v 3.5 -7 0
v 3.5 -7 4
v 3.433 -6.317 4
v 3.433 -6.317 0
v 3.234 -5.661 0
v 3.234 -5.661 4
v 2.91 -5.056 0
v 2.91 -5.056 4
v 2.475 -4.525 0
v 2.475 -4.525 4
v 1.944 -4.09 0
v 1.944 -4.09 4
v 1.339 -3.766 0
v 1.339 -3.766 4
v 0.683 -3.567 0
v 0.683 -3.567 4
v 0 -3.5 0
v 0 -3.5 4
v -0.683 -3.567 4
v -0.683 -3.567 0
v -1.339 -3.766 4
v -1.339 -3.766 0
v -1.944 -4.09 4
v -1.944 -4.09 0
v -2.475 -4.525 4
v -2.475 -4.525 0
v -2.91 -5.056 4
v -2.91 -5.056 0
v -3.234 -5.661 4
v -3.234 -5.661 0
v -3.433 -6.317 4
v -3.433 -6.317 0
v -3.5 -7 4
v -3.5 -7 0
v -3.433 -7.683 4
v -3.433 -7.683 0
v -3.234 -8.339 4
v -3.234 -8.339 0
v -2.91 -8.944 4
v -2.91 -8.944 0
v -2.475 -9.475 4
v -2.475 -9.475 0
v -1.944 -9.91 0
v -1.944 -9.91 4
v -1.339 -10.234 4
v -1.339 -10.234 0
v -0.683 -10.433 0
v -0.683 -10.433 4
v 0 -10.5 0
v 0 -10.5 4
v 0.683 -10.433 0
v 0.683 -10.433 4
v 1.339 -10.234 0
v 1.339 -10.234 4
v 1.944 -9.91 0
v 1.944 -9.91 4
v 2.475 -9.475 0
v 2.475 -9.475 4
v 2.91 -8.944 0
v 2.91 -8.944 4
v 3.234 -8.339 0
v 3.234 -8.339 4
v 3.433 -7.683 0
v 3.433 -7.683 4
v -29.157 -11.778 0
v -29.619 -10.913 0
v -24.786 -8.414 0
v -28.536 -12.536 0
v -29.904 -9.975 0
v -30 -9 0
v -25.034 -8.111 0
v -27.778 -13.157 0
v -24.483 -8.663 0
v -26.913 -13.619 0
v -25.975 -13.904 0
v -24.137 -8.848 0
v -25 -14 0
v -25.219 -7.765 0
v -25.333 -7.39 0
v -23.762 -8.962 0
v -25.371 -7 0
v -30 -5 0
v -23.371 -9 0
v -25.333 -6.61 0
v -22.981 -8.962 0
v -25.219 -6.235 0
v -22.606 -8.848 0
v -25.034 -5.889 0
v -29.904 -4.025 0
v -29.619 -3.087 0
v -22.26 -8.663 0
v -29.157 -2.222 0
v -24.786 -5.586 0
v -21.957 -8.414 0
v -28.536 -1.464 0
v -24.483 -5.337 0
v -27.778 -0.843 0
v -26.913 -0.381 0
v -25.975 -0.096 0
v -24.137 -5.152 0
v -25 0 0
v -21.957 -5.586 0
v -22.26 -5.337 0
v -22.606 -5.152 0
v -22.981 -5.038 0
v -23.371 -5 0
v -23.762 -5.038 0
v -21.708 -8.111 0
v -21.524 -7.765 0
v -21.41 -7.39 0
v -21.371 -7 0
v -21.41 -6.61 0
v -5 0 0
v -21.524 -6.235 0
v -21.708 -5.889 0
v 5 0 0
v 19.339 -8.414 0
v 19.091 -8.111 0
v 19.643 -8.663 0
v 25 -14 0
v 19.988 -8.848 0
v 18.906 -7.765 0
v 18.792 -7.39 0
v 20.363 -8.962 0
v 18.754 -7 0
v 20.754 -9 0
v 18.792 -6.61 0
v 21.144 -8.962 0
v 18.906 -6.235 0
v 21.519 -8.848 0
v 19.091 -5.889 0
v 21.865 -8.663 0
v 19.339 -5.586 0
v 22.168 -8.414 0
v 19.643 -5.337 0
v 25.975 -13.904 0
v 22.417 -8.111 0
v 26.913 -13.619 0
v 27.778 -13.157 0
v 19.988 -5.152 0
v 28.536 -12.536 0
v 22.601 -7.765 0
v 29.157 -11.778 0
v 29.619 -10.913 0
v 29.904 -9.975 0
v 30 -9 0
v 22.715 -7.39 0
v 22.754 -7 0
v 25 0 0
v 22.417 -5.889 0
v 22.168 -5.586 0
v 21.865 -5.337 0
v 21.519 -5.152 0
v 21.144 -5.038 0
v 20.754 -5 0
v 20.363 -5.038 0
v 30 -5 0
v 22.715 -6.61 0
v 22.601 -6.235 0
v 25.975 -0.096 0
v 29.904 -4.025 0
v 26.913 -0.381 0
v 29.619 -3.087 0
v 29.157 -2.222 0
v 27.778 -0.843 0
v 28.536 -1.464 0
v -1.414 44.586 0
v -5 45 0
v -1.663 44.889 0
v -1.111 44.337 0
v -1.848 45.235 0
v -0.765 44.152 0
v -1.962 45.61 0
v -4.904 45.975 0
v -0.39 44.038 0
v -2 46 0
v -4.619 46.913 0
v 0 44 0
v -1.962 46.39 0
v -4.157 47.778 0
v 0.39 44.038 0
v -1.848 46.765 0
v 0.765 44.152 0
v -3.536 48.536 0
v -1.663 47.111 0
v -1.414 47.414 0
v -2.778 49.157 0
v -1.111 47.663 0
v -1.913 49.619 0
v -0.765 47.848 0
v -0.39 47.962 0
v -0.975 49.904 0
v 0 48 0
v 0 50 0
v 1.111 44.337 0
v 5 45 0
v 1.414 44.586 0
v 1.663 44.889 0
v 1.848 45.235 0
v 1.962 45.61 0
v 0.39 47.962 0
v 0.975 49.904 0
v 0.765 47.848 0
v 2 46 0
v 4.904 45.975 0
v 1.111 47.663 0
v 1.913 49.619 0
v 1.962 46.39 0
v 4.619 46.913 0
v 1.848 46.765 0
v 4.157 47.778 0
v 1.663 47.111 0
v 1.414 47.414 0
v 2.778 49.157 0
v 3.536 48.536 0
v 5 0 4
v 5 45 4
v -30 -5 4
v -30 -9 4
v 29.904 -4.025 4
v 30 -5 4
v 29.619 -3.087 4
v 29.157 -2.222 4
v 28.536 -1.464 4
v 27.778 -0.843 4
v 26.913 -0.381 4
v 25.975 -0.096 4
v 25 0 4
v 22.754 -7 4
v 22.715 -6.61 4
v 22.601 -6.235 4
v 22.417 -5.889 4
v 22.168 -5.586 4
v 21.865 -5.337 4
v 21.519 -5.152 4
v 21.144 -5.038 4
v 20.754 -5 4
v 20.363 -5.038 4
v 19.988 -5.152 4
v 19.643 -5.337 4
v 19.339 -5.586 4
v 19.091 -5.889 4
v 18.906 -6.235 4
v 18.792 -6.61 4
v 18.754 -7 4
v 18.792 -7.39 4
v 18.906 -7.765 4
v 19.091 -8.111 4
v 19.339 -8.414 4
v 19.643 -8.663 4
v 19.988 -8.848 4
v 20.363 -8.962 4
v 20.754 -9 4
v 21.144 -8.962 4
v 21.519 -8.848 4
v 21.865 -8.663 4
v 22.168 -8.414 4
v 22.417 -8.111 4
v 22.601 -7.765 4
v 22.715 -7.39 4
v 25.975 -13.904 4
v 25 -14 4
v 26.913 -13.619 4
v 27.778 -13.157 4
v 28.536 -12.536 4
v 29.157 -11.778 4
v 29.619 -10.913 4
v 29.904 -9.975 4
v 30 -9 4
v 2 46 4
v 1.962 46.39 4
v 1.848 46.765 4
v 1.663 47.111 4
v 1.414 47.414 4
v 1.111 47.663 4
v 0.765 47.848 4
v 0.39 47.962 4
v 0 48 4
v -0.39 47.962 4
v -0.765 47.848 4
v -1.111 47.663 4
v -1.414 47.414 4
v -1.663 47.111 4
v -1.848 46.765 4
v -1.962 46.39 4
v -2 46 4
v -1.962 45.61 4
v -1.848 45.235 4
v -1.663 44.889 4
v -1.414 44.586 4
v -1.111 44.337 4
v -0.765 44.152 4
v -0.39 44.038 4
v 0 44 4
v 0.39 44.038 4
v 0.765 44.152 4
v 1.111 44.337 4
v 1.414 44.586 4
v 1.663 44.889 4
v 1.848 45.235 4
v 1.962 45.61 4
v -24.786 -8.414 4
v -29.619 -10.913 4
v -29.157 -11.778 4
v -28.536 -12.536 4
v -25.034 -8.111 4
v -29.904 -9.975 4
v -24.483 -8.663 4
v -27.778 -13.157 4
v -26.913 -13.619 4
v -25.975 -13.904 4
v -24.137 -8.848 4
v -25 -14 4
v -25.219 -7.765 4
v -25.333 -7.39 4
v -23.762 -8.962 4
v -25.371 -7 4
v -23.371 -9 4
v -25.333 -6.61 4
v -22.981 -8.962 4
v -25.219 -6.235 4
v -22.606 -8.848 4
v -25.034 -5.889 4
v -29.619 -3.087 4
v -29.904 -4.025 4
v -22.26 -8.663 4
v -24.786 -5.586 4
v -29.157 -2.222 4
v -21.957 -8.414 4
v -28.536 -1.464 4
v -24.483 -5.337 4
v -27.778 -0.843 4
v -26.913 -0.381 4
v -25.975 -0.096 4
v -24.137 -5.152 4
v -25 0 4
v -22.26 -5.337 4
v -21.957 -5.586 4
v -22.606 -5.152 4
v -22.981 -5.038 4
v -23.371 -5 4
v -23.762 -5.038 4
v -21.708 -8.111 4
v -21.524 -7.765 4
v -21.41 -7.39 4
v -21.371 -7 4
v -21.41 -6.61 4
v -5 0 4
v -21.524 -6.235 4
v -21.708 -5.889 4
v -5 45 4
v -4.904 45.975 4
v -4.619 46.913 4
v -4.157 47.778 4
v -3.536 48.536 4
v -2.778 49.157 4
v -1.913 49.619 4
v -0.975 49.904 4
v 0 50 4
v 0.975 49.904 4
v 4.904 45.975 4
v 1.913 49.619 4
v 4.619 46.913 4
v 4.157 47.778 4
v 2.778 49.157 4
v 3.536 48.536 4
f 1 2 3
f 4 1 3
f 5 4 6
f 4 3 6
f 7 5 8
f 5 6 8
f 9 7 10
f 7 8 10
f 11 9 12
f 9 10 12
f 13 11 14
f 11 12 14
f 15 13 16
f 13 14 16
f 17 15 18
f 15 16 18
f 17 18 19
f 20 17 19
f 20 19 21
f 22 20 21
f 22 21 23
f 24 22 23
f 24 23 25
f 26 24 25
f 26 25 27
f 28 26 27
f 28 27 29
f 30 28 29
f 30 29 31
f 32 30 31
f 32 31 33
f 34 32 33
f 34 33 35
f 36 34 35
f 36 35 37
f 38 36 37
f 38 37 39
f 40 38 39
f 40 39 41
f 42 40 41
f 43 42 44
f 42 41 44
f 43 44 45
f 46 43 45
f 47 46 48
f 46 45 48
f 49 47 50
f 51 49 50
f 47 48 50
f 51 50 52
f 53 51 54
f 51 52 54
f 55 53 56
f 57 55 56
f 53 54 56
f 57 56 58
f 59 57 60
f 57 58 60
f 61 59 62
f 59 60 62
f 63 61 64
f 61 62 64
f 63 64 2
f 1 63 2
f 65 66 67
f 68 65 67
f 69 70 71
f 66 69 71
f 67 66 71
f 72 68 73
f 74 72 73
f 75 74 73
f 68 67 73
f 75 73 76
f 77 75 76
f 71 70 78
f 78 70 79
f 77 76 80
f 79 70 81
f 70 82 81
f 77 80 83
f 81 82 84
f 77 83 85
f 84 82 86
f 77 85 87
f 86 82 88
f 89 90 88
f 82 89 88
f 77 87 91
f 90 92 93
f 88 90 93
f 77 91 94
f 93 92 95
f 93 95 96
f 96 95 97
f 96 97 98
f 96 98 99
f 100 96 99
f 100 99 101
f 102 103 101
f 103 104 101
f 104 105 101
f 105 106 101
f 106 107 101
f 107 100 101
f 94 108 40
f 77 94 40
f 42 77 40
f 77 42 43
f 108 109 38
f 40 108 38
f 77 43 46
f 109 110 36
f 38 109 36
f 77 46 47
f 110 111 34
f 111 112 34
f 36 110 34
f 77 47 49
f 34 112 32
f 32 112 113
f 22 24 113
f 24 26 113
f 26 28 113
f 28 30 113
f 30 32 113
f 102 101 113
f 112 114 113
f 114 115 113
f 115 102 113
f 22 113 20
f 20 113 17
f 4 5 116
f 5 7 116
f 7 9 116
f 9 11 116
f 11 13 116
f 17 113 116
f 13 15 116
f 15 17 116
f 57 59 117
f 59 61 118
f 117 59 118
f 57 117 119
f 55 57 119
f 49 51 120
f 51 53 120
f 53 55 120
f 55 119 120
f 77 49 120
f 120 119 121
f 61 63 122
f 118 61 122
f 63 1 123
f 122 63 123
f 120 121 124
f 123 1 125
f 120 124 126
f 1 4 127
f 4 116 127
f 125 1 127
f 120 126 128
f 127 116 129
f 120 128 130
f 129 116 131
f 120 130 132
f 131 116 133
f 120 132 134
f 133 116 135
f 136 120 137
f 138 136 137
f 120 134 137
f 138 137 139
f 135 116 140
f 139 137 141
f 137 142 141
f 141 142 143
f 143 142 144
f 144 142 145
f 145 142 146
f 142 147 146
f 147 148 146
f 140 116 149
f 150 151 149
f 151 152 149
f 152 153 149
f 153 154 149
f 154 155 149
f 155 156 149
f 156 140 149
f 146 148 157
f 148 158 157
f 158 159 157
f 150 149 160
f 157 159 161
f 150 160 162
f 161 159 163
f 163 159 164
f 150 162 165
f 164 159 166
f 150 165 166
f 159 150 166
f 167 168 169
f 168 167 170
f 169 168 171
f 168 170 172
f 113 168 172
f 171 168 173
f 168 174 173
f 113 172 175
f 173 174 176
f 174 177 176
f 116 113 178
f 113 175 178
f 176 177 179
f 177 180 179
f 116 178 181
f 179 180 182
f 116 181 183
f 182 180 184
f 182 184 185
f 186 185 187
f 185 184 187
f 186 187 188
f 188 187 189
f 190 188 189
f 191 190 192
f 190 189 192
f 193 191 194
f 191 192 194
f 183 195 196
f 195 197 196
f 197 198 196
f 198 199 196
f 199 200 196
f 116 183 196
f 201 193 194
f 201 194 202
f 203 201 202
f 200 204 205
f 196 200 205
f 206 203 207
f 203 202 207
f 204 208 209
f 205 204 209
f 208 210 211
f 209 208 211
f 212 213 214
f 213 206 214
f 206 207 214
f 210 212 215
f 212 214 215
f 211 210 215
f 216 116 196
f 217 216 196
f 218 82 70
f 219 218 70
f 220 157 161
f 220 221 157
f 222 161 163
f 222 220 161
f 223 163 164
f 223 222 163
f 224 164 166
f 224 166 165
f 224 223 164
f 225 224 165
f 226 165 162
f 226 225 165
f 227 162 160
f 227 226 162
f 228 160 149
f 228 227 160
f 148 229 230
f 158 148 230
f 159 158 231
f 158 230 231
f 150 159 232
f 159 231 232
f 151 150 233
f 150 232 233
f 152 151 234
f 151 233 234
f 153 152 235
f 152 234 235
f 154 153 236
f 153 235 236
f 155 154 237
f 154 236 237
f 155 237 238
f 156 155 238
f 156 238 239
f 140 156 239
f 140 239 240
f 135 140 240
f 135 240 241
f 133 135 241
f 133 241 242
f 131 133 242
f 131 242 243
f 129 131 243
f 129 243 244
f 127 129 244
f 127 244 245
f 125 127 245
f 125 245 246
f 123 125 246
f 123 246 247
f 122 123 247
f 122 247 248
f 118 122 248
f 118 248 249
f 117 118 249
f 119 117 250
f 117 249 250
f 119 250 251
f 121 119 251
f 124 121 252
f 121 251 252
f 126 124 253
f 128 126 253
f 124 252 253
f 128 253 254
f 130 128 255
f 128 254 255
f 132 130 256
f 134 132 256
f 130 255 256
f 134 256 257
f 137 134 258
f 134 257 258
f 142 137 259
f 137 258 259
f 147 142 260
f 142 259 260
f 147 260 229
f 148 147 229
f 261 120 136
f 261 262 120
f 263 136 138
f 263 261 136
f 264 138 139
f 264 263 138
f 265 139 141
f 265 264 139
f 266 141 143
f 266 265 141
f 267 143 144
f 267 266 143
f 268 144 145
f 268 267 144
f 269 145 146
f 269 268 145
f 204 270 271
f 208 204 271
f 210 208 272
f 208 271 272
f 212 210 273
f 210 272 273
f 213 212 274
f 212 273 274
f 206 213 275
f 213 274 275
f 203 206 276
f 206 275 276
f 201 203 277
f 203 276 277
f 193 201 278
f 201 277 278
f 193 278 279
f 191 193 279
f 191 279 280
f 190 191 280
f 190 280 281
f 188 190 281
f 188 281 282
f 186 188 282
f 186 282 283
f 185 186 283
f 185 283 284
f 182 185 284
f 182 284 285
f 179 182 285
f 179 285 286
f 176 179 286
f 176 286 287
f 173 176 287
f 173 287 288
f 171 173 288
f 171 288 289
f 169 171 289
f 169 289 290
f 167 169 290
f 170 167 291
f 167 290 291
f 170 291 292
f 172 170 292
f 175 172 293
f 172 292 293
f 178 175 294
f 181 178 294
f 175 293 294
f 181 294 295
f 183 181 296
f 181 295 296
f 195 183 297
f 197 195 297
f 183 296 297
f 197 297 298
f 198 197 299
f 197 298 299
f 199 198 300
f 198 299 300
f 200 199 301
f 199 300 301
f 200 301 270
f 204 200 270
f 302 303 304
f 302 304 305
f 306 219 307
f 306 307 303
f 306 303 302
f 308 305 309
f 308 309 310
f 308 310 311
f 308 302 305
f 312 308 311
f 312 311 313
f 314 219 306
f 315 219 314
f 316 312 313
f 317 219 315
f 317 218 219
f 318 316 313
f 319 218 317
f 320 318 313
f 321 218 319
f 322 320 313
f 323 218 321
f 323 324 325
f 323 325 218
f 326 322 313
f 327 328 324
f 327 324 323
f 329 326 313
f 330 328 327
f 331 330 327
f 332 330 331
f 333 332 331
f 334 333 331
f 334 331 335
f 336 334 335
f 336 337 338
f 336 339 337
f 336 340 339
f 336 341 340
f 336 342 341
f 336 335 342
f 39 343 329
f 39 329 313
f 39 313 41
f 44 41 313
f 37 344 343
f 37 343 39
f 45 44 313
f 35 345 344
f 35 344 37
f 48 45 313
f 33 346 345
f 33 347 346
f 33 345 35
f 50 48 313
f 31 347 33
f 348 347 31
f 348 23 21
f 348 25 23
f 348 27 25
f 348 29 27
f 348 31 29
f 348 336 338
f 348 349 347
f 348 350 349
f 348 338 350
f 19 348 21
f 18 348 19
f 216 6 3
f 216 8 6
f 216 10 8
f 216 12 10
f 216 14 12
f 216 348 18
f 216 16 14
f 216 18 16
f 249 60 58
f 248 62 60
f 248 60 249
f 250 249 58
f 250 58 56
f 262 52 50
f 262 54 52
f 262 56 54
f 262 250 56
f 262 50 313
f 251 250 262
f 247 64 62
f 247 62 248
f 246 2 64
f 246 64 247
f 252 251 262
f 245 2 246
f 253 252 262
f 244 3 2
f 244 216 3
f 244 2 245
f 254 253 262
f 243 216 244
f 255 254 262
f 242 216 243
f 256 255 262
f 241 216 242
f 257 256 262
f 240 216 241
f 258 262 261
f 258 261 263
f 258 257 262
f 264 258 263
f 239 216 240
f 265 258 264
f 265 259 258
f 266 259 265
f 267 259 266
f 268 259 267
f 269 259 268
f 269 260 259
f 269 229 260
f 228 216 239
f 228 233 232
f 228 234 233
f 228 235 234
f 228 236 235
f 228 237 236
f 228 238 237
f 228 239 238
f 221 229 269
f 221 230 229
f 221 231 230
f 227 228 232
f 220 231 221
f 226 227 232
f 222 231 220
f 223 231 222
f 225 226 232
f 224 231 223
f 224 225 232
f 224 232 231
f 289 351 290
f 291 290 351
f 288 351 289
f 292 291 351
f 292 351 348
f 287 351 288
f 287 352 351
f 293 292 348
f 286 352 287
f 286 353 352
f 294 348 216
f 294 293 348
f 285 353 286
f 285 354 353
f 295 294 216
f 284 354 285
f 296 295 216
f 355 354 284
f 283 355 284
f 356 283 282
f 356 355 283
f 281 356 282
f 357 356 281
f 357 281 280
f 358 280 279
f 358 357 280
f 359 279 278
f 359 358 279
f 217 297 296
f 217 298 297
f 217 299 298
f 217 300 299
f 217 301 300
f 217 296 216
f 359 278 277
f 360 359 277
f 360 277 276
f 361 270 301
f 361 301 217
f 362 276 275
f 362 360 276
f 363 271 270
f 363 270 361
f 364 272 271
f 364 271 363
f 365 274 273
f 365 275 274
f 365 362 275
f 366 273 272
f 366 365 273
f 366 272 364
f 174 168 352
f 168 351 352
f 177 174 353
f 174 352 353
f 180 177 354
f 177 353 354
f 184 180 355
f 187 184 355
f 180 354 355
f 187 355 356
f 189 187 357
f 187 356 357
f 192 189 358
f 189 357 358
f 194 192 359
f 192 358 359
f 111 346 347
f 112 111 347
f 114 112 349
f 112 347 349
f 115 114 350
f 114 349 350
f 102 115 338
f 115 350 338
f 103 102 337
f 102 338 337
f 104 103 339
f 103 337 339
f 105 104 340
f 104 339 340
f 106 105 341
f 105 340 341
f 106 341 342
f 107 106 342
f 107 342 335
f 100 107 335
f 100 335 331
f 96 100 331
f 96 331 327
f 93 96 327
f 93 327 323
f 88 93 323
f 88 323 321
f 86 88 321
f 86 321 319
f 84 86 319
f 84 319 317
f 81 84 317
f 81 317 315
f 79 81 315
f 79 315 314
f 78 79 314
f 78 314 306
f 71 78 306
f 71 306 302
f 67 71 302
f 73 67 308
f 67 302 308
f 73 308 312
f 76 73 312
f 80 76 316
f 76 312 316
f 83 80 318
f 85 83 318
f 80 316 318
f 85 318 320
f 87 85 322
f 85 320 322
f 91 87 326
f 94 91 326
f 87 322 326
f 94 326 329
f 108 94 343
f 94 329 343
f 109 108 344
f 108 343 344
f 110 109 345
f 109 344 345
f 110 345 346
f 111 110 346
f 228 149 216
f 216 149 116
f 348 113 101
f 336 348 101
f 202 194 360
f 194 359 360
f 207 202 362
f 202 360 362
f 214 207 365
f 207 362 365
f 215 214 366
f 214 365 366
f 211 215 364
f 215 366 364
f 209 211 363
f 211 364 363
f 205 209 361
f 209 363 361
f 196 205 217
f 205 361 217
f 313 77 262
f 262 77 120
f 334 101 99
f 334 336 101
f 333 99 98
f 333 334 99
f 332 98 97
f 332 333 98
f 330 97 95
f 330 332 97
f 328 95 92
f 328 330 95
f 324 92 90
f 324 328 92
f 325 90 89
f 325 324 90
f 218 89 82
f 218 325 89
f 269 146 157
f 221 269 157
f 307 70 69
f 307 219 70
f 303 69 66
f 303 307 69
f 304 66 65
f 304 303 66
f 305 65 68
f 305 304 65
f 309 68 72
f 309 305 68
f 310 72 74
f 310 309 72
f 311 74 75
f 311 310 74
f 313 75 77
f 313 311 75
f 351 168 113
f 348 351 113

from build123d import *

# Parameters (mm, degrees)
F1_DEPTH = 4
F2_R     = 2
F2_R_2   = 3.5
F3_DEPTH = 25
F4_R     = 4.99999


# Not quite as in the source:
# - a fillet or chamfer is up to 0.001 mm smaller than in the source, because OpenCascade refuses the exact size


with BuildPart() as f1:
    # F0 (on Top) → F1 (new body)
    with BuildSketch(Plane.XY):
        Polygon((-5, 0), (-30, 0), (-30, -14), (30, -14), (30, 0), (5, 0), (5, 50), (-5, 50), align=None)
    extrude(amount=F1_DEPTH)

    # F2 (on face) → F3 (cut)
    with BuildSketch(Plane.XY.offset(4)):
        with Locations((-23.3714003116, -7)):
            Circle(F2_R)
        with Locations((20.7536797971, -7)):
            Circle(F2_R)
        with Locations((0, -7)):
            Circle(F2_R_2)
        with Locations((0, 46)):
            Circle(F2_R)
    extrude(amount=-F3_DEPTH, mode=Mode.SUBTRACT)

    # F4 (radius 5 in the source; OpenCascade refuses exactly that, so slightly less here)
    f4_edges = [f1.edges().sort_by_distance(p)[0] for p in [
        (-5, 50, 2),
        (5, 50, 2),
        (30, 0, 2),
        (30, -14, 2),
        (-30, -14, 2),
        (-30, 0, 2),
    ]]
    fillet(f4_edges, radius=F4_R)


solid = f1.part
